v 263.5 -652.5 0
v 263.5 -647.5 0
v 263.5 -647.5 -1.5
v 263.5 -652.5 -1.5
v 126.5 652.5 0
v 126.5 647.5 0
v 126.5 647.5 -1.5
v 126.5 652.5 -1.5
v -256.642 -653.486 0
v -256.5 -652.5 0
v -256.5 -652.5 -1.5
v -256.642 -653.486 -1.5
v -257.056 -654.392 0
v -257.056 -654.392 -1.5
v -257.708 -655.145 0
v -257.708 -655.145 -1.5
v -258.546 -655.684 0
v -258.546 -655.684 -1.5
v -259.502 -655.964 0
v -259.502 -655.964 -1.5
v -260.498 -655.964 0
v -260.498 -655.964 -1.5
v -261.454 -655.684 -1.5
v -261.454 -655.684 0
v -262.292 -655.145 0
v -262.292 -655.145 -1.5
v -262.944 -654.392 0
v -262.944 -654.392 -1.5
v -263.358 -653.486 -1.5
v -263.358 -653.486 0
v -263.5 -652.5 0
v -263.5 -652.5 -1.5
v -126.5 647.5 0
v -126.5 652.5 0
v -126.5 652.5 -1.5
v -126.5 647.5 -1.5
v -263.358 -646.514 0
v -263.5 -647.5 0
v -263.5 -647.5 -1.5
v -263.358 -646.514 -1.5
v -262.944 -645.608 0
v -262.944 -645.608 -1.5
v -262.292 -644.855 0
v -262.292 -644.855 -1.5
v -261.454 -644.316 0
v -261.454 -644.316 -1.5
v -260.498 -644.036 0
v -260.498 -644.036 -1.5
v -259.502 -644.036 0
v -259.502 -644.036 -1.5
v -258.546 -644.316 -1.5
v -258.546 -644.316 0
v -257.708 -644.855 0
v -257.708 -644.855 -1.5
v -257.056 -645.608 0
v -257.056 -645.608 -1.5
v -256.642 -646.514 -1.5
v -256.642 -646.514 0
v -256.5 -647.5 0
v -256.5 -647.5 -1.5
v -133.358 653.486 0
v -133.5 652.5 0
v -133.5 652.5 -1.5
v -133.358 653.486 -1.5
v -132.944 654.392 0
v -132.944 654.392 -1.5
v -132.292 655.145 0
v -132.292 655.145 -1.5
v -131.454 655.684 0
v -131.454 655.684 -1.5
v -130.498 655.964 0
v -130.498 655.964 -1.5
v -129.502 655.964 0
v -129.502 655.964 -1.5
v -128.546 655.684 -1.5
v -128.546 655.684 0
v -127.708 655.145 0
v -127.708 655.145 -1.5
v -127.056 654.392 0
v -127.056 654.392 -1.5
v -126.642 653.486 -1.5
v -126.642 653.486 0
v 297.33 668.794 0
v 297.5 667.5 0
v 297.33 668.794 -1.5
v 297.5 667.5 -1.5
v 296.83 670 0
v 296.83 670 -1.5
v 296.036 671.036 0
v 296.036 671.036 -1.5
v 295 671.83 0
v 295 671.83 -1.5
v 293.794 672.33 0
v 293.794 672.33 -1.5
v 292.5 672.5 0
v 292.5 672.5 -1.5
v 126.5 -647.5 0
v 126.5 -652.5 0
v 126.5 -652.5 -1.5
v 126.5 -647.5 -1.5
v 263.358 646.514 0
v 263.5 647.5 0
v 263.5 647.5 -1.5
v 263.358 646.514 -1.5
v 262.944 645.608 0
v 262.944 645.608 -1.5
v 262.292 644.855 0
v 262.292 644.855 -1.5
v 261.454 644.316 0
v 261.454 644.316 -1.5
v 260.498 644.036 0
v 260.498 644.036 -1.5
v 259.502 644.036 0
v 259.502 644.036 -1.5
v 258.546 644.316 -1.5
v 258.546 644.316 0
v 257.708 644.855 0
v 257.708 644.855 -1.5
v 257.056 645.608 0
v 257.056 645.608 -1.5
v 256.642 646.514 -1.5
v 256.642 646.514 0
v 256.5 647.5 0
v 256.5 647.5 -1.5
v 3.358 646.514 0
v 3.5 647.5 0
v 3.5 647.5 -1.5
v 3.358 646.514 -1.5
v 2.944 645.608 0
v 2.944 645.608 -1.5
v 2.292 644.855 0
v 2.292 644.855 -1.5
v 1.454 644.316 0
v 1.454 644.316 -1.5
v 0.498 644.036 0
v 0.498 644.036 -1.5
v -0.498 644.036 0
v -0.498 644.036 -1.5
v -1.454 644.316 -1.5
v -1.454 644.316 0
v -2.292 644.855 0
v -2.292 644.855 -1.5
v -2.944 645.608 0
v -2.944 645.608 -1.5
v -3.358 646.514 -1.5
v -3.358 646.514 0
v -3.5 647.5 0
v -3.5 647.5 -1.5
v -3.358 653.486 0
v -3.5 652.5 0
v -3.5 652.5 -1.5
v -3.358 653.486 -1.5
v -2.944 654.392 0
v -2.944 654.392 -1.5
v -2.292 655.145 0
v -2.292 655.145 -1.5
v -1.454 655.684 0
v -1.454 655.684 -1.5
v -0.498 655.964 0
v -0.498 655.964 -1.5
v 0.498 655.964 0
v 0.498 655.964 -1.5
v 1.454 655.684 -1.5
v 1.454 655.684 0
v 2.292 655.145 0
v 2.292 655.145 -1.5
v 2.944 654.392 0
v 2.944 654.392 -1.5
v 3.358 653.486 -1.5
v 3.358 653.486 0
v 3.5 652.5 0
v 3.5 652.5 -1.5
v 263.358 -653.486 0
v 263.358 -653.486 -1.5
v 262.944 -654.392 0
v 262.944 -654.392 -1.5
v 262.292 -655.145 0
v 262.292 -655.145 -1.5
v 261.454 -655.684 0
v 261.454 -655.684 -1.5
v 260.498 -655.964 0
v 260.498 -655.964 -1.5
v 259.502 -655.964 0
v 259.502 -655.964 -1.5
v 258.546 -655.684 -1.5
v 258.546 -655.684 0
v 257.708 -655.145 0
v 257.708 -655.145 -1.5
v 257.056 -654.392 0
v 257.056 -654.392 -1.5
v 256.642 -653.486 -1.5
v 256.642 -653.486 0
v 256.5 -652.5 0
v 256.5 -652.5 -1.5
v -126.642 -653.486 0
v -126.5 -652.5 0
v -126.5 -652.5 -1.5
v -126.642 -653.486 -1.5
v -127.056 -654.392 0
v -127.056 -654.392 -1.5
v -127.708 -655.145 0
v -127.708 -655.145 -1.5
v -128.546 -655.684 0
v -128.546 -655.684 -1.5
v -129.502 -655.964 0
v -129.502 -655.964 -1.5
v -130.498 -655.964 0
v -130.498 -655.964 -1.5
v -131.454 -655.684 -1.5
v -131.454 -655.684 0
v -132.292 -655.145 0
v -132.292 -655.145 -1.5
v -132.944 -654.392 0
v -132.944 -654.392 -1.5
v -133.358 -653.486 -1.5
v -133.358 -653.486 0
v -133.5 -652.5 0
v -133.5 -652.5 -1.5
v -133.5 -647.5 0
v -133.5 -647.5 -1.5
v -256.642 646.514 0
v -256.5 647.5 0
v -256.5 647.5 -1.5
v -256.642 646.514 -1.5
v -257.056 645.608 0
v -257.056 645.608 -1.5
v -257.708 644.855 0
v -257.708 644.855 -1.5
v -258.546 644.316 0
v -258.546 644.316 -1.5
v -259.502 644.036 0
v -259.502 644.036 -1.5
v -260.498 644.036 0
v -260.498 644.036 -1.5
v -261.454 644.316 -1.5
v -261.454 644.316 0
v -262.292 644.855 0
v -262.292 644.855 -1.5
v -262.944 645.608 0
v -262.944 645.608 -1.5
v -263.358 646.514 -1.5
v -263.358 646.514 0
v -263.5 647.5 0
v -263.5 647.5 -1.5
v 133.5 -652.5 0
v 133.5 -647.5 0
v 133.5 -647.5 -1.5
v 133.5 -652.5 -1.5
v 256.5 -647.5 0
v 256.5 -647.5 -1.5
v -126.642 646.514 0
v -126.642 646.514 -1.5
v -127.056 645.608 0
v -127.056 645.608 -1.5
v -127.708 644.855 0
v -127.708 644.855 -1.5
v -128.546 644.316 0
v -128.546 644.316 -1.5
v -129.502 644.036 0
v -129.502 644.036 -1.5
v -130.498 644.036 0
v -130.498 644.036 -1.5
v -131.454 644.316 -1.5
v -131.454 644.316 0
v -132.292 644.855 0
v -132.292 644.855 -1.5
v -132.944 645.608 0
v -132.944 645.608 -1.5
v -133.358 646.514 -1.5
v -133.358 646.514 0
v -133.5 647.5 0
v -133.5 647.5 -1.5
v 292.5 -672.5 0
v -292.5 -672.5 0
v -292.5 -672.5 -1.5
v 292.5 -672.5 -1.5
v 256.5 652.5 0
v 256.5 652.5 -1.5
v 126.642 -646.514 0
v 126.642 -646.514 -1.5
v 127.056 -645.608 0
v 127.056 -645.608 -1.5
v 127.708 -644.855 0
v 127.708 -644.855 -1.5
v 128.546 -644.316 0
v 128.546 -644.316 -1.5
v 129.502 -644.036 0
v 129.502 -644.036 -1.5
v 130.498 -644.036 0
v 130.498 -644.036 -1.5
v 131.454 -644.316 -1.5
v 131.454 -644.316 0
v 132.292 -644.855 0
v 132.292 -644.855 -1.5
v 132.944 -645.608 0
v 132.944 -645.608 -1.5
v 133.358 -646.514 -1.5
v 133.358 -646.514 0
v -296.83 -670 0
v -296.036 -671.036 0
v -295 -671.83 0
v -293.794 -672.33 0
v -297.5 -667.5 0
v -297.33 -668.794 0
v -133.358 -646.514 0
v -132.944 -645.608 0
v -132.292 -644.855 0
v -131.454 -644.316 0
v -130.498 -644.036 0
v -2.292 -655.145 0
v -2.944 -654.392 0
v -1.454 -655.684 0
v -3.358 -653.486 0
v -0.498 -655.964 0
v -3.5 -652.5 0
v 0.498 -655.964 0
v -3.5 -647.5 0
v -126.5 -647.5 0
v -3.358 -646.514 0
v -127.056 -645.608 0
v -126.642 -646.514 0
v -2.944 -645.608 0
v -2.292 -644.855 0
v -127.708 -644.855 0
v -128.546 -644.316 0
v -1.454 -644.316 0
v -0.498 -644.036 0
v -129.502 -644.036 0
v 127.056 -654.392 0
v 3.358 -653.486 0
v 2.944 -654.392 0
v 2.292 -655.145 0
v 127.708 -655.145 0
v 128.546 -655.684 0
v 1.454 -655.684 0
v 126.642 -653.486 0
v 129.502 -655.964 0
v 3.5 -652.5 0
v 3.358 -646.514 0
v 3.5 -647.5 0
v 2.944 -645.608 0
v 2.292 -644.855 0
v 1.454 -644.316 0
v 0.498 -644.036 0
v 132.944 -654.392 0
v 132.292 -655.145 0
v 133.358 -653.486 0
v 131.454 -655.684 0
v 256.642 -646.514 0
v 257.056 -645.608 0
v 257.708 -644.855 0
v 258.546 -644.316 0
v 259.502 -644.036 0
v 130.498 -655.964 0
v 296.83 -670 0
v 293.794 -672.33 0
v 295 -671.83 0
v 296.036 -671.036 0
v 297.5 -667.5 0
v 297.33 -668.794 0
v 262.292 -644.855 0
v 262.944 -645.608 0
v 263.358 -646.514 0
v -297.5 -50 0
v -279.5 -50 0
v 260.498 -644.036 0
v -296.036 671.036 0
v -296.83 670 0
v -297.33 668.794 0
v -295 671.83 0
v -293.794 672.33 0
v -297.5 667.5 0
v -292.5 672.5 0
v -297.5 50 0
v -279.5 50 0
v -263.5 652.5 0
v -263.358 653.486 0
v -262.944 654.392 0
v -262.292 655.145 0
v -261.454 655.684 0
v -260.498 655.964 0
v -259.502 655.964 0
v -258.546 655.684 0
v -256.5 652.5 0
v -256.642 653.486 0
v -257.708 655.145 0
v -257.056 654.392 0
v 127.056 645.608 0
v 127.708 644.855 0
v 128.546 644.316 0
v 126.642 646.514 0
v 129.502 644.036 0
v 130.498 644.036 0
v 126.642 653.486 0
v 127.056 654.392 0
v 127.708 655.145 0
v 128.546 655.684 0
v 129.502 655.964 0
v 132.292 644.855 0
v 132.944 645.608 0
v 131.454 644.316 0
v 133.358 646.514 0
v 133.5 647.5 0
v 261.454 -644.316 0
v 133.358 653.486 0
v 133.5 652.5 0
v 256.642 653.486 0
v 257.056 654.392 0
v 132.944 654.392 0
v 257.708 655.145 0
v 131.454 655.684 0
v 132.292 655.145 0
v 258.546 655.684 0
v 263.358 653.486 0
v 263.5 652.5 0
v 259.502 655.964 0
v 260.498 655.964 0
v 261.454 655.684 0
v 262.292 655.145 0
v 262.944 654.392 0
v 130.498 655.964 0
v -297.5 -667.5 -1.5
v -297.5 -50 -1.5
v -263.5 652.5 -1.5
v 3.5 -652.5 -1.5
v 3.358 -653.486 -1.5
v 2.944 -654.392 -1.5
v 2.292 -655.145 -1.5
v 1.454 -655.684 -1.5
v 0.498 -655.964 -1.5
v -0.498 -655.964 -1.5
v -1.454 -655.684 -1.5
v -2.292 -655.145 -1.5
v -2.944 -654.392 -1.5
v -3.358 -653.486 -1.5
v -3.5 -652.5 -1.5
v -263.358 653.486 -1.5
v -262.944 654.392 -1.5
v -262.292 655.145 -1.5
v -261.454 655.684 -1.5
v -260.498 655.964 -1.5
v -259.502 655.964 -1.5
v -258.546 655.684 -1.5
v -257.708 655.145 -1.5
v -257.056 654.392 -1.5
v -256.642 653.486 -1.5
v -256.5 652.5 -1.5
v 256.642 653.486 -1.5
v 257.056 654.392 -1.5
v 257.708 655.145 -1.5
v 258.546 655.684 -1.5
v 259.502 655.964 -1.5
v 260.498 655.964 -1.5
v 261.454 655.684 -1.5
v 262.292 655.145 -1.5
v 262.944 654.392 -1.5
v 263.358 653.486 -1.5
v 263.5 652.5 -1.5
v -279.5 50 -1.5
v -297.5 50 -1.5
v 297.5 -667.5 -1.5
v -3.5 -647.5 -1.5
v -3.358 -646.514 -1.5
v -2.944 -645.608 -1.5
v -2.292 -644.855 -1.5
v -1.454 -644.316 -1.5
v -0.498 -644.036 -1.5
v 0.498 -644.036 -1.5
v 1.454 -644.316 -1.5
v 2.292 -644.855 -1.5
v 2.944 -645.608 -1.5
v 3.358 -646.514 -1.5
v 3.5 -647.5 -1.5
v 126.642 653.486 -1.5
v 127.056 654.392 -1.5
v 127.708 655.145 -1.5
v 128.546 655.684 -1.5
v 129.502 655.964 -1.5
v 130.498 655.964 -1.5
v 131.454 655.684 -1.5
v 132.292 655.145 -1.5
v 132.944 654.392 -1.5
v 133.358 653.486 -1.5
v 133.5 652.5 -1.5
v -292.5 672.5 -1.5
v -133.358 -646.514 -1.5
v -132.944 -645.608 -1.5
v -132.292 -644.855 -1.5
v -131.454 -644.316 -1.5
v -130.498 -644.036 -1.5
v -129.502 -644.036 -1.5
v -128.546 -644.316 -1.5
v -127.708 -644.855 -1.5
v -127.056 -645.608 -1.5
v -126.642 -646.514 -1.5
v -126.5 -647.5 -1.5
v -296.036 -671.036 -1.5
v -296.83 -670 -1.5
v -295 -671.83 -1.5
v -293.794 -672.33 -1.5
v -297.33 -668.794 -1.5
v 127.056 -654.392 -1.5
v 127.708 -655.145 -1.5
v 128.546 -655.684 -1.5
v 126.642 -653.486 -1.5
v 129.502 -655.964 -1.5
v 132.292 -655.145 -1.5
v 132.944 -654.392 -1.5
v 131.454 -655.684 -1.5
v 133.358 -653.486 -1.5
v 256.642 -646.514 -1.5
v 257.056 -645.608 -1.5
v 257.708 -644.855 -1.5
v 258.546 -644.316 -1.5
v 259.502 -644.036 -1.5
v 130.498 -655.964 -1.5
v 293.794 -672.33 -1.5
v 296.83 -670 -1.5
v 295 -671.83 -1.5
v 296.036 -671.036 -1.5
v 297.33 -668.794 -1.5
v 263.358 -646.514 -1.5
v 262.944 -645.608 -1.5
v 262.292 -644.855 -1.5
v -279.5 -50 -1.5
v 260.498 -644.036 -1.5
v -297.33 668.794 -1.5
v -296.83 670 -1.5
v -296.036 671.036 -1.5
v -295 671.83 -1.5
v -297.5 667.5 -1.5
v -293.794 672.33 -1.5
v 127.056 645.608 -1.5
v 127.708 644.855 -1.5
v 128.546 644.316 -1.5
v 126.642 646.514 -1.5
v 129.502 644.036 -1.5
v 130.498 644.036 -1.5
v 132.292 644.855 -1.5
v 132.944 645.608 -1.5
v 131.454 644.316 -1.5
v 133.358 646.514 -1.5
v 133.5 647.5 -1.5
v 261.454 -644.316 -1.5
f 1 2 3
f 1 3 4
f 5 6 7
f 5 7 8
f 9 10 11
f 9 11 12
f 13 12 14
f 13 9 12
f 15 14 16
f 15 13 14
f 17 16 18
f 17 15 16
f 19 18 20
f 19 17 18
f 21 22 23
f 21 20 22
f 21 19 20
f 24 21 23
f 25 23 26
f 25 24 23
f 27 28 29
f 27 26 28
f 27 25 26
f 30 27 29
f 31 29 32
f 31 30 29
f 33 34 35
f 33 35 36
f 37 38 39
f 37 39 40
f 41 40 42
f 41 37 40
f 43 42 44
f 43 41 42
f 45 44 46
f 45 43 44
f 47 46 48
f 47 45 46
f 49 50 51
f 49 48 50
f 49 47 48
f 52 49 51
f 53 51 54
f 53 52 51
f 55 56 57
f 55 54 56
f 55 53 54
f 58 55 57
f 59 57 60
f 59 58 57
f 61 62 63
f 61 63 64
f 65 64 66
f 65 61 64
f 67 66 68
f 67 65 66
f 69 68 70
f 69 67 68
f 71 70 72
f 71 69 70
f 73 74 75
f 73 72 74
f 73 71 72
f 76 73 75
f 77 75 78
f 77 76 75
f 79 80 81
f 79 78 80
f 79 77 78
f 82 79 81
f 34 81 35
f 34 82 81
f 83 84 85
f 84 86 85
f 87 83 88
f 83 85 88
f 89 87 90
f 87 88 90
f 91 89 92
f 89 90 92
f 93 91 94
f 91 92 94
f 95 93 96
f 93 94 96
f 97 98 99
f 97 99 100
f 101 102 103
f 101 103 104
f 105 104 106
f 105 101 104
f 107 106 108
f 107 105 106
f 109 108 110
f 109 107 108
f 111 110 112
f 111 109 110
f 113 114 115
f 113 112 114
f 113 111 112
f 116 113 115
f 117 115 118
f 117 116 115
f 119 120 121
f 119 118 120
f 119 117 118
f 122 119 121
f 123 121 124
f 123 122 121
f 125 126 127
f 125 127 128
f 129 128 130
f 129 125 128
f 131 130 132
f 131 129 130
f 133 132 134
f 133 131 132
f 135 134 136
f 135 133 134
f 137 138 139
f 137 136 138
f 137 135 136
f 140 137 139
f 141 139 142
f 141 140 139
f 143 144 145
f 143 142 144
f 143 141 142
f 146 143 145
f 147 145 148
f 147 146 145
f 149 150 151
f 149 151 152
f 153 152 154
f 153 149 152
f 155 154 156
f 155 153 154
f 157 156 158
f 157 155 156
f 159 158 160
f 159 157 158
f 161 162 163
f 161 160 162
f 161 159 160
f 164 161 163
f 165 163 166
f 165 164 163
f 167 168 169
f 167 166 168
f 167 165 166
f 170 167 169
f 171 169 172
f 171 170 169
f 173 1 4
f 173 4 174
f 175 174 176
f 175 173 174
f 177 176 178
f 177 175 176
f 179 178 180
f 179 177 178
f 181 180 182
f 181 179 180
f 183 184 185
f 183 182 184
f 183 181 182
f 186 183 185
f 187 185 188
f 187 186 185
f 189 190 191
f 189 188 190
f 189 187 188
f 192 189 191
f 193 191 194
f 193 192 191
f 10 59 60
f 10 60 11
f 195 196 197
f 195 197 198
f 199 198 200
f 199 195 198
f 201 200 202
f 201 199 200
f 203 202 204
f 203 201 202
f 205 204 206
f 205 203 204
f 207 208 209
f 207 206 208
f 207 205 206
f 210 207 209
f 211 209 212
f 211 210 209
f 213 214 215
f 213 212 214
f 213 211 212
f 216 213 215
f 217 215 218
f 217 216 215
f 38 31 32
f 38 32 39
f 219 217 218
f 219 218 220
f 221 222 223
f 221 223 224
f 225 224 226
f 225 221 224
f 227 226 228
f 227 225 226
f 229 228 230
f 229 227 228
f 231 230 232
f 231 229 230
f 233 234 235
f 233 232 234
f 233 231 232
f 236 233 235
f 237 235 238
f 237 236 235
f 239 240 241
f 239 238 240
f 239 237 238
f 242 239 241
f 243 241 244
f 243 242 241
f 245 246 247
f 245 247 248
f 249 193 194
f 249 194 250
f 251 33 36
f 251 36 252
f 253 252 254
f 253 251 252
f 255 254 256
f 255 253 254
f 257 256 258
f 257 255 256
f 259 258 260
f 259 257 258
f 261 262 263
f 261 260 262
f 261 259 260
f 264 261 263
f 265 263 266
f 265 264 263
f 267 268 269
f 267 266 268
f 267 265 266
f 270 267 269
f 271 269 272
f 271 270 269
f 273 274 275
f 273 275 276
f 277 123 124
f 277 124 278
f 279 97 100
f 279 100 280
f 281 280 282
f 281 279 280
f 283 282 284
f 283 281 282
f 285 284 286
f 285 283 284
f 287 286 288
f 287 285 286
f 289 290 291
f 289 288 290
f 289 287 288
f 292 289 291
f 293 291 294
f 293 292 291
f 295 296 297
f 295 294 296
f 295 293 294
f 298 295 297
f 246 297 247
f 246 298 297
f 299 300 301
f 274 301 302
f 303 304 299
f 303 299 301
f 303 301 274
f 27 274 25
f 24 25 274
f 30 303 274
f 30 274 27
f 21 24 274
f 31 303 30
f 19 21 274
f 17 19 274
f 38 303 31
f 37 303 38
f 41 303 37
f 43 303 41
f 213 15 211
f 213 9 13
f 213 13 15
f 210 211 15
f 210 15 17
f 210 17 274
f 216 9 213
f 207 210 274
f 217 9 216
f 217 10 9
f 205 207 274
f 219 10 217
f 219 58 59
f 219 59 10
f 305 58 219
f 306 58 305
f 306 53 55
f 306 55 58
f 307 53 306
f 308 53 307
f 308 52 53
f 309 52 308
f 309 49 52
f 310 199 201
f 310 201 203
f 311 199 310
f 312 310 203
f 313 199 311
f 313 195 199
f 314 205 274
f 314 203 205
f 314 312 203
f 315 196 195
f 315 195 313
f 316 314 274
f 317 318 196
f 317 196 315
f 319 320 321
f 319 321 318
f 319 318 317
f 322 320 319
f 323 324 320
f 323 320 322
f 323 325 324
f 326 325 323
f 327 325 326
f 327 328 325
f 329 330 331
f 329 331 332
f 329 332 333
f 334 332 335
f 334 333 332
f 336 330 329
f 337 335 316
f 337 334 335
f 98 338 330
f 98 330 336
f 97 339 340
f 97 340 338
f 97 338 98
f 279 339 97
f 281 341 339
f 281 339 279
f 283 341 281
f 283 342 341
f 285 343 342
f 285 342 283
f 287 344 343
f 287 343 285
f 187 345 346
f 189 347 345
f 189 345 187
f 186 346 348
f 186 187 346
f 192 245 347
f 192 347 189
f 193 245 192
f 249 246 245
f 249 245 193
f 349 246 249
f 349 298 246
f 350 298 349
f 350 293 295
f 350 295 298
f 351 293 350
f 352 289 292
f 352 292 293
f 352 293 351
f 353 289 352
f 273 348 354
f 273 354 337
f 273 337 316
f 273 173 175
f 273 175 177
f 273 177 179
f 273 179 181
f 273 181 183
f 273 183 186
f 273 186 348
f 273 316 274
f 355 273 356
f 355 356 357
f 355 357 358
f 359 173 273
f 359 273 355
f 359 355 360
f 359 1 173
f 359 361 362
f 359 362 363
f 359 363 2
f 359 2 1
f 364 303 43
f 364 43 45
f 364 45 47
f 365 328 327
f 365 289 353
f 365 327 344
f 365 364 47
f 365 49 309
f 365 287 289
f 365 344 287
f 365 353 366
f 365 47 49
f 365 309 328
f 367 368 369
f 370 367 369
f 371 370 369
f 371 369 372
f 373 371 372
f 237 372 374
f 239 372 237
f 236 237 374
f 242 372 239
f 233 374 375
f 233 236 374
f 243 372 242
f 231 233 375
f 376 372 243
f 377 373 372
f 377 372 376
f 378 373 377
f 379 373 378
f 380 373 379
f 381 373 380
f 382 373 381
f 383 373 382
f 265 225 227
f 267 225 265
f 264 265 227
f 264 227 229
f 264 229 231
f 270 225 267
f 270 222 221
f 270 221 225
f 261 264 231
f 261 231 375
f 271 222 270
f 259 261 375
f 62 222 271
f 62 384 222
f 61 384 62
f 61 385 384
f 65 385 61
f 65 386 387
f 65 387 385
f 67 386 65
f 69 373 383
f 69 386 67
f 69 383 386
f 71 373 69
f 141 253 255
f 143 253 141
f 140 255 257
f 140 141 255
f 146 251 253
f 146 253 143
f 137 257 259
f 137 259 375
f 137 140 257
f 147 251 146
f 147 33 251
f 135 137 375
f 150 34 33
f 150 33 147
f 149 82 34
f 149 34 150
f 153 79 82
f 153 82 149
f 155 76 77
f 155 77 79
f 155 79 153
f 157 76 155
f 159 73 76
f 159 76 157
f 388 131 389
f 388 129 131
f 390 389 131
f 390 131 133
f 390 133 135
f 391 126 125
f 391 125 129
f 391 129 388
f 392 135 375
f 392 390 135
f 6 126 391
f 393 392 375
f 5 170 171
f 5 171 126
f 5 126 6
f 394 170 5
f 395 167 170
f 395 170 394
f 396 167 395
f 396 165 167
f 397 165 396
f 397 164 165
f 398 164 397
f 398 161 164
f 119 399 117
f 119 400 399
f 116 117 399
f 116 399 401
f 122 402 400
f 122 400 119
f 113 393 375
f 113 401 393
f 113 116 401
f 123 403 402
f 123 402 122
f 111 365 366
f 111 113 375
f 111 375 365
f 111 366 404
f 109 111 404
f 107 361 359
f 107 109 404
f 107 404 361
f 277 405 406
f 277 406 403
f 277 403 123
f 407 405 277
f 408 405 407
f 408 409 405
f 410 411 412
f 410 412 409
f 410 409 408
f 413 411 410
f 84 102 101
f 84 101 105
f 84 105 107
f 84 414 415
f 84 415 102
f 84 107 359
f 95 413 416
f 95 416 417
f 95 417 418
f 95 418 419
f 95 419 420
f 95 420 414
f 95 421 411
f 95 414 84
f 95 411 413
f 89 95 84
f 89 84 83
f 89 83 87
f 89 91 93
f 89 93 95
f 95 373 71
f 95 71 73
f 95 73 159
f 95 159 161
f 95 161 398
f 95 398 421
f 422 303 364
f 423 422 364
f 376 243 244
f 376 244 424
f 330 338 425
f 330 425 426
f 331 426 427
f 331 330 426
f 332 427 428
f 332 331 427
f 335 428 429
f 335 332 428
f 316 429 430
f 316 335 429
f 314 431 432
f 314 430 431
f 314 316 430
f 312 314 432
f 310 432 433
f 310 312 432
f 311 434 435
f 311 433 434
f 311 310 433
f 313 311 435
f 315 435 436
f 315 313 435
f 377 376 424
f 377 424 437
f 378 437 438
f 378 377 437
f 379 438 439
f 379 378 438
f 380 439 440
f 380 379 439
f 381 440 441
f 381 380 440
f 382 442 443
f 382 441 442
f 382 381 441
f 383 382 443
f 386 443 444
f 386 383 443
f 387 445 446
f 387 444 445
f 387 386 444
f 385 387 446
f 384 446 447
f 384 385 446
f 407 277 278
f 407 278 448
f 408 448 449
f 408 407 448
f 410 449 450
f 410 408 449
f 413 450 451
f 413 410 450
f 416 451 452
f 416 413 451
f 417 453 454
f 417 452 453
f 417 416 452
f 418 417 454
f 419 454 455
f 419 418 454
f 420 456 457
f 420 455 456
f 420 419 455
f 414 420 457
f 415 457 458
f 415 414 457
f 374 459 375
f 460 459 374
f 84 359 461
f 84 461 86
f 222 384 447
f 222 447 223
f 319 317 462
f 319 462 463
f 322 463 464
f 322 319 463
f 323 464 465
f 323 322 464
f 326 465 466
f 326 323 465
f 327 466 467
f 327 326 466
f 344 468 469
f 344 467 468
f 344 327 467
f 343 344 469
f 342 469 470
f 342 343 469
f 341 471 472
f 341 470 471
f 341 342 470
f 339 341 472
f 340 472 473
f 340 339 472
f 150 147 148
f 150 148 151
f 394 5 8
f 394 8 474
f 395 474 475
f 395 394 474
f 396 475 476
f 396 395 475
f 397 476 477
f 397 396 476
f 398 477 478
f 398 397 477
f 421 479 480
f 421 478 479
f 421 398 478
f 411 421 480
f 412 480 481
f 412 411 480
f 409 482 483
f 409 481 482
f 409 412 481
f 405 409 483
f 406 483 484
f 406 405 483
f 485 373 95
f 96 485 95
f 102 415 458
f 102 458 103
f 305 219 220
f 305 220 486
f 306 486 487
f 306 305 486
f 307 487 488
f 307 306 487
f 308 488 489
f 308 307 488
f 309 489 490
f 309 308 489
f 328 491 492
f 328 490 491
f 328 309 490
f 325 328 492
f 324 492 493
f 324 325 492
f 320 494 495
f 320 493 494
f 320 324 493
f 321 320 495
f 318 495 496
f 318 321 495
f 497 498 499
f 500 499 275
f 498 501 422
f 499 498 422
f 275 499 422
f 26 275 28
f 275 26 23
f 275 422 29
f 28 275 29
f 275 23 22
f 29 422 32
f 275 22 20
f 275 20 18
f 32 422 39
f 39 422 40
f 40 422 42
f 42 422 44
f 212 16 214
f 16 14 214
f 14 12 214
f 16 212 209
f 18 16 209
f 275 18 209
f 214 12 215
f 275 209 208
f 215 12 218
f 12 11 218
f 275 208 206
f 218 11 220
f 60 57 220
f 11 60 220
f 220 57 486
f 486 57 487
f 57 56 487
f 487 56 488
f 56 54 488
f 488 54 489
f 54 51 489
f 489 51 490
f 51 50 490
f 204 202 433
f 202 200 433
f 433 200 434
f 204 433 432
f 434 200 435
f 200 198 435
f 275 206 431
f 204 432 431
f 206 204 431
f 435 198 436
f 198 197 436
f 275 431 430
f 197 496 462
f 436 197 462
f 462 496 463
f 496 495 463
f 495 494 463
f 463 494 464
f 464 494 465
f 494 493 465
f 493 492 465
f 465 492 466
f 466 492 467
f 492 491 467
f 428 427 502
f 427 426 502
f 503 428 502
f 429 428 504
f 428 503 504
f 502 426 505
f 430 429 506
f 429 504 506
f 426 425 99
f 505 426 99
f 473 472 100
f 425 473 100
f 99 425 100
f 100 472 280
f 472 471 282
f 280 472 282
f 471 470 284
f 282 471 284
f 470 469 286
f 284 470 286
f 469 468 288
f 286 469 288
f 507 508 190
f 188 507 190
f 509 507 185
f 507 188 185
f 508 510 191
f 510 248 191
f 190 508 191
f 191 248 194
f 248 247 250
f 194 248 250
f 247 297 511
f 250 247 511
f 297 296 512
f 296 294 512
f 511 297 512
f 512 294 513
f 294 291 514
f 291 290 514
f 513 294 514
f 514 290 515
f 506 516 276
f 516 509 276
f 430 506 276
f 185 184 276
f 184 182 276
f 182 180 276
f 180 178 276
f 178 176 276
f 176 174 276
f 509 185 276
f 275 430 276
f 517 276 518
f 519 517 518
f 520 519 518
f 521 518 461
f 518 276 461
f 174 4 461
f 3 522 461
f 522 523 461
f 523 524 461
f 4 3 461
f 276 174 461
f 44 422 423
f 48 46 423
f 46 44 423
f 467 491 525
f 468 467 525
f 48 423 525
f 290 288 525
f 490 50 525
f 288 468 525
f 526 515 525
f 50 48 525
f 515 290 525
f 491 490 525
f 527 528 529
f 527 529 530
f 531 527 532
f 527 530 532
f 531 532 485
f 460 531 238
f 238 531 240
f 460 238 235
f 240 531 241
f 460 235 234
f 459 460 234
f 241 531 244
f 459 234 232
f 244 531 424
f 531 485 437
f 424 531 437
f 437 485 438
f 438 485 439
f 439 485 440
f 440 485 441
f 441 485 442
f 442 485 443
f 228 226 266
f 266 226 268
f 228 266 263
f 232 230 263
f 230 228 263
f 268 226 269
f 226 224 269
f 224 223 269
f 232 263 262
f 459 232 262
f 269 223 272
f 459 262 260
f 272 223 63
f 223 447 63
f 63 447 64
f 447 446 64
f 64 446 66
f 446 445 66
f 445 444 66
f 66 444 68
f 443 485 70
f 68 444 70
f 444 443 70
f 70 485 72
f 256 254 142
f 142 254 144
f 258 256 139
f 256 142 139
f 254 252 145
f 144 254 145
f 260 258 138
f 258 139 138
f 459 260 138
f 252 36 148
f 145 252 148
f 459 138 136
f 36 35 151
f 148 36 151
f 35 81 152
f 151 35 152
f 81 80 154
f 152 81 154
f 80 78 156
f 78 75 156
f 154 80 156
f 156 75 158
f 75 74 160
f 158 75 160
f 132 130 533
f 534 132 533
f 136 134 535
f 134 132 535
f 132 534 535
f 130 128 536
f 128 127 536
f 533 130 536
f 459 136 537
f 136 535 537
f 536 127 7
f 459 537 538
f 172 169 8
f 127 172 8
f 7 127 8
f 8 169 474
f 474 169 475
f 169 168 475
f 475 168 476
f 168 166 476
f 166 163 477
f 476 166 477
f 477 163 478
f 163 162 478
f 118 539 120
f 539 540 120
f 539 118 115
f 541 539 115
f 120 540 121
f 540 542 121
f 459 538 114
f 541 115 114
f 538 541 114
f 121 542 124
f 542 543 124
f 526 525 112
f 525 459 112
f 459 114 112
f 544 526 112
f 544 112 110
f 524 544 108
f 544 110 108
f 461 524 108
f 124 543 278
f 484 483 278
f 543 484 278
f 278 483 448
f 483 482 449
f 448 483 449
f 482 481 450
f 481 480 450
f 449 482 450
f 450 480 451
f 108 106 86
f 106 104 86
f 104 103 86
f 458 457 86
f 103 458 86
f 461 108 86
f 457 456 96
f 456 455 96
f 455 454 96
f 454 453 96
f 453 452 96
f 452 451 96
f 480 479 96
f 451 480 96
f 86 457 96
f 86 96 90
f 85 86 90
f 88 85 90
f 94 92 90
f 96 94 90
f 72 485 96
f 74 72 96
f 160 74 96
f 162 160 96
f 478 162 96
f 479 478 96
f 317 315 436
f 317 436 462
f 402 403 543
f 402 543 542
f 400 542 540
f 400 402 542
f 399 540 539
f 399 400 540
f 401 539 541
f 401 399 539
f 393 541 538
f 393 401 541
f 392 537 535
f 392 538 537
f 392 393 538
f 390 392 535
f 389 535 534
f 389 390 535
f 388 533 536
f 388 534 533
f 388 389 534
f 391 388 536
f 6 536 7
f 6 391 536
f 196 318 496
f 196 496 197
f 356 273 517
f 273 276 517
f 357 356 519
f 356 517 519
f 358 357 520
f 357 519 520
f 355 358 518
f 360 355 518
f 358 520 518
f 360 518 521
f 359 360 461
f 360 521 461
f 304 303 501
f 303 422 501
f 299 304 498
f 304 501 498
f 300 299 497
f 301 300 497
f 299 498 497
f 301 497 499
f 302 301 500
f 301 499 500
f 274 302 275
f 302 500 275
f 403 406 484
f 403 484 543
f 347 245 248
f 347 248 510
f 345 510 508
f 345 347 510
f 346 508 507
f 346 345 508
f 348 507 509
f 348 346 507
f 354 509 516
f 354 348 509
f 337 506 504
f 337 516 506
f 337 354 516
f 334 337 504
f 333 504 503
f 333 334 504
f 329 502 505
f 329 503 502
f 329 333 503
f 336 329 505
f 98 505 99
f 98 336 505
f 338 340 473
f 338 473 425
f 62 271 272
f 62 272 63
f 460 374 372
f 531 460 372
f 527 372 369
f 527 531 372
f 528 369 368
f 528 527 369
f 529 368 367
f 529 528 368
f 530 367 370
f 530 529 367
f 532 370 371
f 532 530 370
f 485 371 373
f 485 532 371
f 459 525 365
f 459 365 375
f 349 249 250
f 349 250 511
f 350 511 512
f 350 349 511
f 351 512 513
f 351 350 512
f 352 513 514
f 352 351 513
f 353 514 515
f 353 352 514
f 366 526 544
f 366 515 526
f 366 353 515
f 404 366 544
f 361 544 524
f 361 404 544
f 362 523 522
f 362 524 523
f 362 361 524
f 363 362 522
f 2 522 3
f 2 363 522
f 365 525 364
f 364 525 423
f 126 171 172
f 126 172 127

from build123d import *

# Parameters (mm, degrees)
SKETCH_1_W             = 595
SKETCH_1_H             = 1345
SM_BASE_FLANGE_1_DEPTH = 1.5
FILLET_1_R             = 5
CUT_EXTRUDE_1_DEPTH    = 10
PATTERN_LINEAR_1_COUNT = 5
PATTERN_LINEAR_1_PITCH = 130
SKETCH_3_W             = 18
SKETCH_3_H             = 100
CUT_EXTRUDE_2_DEPTH    = 10


# Sheet-metal steps are written as plain solids
with BuildPart() as part:
    # Sketch 1 → 基体-法兰1 (new body)
    with BuildSketch(Plane.XY):
        Rectangle(SKETCH_1_W, SKETCH_1_H)
    extrude(amount=-SM_BASE_FLANGE_1_DEPTH)

    # 圆角1
    fillet_1_edges = [part.edges().sort_by_distance(p)[0] for p in [
        (-297.5, 672.5, -0.75),
        (297.5, 672.5, -0.75),
        (297.5, -672.5, -0.75),
        (-297.5, -672.5, -0.75),
    ]]
    fillet(fillet_1_edges, radius=FILLET_1_R)

    # Sketch 2 → 切除-拉伸1 (cut)
    with BuildSketch(Plane.XY):
        with BuildLine():
            Line((-263.5, 647.5), (-263.5, 652.5))
            ThreePointArc((-263.5, 652.5), (-260, 656), (-256.5, 652.5))
            Line((-256.5, 652.5), (-256.5, 647.5))
            ThreePointArc((-256.5, 647.5), (-260, 644), (-263.5, 647.5))
        make_face()
        with BuildLine():
            Line((-263.5, -652.5), (-263.5, -647.5))
            ThreePointArc((-263.5, -647.5), (-260, -644), (-256.5, -647.5))
            Line((-256.5, -647.5), (-256.5, -652.5))
            ThreePointArc((-256.5, -652.5), (-260, -656), (-263.5, -652.5))
        make_face()
    cut_extrude_1 = extrude(amount=-CUT_EXTRUDE_1_DEPTH, mode=Mode.SUBTRACT)

    # 阵列(线性)1: 切除-拉伸1 ×5
    with Locations(*[(i * PATTERN_LINEAR_1_PITCH, 0, 0) for i in range(1, PATTERN_LINEAR_1_COUNT)]):
        add(cut_extrude_1, mode=Mode.SUBTRACT)

    # 草图3 → 切除-拉伸2 (cut)
    with BuildSketch(Plane(origin=(0, 0, -1.5), x_dir=(-1, 0, 0), z_dir=(0, 0, -1))):
        with Locations((288.5, 0)):
            Rectangle(SKETCH_3_W, SKETCH_3_H)
    extrude(amount=-CUT_EXTRUDE_2_DEPTH, mode=Mode.SUBTRACT)


solid = part.part
